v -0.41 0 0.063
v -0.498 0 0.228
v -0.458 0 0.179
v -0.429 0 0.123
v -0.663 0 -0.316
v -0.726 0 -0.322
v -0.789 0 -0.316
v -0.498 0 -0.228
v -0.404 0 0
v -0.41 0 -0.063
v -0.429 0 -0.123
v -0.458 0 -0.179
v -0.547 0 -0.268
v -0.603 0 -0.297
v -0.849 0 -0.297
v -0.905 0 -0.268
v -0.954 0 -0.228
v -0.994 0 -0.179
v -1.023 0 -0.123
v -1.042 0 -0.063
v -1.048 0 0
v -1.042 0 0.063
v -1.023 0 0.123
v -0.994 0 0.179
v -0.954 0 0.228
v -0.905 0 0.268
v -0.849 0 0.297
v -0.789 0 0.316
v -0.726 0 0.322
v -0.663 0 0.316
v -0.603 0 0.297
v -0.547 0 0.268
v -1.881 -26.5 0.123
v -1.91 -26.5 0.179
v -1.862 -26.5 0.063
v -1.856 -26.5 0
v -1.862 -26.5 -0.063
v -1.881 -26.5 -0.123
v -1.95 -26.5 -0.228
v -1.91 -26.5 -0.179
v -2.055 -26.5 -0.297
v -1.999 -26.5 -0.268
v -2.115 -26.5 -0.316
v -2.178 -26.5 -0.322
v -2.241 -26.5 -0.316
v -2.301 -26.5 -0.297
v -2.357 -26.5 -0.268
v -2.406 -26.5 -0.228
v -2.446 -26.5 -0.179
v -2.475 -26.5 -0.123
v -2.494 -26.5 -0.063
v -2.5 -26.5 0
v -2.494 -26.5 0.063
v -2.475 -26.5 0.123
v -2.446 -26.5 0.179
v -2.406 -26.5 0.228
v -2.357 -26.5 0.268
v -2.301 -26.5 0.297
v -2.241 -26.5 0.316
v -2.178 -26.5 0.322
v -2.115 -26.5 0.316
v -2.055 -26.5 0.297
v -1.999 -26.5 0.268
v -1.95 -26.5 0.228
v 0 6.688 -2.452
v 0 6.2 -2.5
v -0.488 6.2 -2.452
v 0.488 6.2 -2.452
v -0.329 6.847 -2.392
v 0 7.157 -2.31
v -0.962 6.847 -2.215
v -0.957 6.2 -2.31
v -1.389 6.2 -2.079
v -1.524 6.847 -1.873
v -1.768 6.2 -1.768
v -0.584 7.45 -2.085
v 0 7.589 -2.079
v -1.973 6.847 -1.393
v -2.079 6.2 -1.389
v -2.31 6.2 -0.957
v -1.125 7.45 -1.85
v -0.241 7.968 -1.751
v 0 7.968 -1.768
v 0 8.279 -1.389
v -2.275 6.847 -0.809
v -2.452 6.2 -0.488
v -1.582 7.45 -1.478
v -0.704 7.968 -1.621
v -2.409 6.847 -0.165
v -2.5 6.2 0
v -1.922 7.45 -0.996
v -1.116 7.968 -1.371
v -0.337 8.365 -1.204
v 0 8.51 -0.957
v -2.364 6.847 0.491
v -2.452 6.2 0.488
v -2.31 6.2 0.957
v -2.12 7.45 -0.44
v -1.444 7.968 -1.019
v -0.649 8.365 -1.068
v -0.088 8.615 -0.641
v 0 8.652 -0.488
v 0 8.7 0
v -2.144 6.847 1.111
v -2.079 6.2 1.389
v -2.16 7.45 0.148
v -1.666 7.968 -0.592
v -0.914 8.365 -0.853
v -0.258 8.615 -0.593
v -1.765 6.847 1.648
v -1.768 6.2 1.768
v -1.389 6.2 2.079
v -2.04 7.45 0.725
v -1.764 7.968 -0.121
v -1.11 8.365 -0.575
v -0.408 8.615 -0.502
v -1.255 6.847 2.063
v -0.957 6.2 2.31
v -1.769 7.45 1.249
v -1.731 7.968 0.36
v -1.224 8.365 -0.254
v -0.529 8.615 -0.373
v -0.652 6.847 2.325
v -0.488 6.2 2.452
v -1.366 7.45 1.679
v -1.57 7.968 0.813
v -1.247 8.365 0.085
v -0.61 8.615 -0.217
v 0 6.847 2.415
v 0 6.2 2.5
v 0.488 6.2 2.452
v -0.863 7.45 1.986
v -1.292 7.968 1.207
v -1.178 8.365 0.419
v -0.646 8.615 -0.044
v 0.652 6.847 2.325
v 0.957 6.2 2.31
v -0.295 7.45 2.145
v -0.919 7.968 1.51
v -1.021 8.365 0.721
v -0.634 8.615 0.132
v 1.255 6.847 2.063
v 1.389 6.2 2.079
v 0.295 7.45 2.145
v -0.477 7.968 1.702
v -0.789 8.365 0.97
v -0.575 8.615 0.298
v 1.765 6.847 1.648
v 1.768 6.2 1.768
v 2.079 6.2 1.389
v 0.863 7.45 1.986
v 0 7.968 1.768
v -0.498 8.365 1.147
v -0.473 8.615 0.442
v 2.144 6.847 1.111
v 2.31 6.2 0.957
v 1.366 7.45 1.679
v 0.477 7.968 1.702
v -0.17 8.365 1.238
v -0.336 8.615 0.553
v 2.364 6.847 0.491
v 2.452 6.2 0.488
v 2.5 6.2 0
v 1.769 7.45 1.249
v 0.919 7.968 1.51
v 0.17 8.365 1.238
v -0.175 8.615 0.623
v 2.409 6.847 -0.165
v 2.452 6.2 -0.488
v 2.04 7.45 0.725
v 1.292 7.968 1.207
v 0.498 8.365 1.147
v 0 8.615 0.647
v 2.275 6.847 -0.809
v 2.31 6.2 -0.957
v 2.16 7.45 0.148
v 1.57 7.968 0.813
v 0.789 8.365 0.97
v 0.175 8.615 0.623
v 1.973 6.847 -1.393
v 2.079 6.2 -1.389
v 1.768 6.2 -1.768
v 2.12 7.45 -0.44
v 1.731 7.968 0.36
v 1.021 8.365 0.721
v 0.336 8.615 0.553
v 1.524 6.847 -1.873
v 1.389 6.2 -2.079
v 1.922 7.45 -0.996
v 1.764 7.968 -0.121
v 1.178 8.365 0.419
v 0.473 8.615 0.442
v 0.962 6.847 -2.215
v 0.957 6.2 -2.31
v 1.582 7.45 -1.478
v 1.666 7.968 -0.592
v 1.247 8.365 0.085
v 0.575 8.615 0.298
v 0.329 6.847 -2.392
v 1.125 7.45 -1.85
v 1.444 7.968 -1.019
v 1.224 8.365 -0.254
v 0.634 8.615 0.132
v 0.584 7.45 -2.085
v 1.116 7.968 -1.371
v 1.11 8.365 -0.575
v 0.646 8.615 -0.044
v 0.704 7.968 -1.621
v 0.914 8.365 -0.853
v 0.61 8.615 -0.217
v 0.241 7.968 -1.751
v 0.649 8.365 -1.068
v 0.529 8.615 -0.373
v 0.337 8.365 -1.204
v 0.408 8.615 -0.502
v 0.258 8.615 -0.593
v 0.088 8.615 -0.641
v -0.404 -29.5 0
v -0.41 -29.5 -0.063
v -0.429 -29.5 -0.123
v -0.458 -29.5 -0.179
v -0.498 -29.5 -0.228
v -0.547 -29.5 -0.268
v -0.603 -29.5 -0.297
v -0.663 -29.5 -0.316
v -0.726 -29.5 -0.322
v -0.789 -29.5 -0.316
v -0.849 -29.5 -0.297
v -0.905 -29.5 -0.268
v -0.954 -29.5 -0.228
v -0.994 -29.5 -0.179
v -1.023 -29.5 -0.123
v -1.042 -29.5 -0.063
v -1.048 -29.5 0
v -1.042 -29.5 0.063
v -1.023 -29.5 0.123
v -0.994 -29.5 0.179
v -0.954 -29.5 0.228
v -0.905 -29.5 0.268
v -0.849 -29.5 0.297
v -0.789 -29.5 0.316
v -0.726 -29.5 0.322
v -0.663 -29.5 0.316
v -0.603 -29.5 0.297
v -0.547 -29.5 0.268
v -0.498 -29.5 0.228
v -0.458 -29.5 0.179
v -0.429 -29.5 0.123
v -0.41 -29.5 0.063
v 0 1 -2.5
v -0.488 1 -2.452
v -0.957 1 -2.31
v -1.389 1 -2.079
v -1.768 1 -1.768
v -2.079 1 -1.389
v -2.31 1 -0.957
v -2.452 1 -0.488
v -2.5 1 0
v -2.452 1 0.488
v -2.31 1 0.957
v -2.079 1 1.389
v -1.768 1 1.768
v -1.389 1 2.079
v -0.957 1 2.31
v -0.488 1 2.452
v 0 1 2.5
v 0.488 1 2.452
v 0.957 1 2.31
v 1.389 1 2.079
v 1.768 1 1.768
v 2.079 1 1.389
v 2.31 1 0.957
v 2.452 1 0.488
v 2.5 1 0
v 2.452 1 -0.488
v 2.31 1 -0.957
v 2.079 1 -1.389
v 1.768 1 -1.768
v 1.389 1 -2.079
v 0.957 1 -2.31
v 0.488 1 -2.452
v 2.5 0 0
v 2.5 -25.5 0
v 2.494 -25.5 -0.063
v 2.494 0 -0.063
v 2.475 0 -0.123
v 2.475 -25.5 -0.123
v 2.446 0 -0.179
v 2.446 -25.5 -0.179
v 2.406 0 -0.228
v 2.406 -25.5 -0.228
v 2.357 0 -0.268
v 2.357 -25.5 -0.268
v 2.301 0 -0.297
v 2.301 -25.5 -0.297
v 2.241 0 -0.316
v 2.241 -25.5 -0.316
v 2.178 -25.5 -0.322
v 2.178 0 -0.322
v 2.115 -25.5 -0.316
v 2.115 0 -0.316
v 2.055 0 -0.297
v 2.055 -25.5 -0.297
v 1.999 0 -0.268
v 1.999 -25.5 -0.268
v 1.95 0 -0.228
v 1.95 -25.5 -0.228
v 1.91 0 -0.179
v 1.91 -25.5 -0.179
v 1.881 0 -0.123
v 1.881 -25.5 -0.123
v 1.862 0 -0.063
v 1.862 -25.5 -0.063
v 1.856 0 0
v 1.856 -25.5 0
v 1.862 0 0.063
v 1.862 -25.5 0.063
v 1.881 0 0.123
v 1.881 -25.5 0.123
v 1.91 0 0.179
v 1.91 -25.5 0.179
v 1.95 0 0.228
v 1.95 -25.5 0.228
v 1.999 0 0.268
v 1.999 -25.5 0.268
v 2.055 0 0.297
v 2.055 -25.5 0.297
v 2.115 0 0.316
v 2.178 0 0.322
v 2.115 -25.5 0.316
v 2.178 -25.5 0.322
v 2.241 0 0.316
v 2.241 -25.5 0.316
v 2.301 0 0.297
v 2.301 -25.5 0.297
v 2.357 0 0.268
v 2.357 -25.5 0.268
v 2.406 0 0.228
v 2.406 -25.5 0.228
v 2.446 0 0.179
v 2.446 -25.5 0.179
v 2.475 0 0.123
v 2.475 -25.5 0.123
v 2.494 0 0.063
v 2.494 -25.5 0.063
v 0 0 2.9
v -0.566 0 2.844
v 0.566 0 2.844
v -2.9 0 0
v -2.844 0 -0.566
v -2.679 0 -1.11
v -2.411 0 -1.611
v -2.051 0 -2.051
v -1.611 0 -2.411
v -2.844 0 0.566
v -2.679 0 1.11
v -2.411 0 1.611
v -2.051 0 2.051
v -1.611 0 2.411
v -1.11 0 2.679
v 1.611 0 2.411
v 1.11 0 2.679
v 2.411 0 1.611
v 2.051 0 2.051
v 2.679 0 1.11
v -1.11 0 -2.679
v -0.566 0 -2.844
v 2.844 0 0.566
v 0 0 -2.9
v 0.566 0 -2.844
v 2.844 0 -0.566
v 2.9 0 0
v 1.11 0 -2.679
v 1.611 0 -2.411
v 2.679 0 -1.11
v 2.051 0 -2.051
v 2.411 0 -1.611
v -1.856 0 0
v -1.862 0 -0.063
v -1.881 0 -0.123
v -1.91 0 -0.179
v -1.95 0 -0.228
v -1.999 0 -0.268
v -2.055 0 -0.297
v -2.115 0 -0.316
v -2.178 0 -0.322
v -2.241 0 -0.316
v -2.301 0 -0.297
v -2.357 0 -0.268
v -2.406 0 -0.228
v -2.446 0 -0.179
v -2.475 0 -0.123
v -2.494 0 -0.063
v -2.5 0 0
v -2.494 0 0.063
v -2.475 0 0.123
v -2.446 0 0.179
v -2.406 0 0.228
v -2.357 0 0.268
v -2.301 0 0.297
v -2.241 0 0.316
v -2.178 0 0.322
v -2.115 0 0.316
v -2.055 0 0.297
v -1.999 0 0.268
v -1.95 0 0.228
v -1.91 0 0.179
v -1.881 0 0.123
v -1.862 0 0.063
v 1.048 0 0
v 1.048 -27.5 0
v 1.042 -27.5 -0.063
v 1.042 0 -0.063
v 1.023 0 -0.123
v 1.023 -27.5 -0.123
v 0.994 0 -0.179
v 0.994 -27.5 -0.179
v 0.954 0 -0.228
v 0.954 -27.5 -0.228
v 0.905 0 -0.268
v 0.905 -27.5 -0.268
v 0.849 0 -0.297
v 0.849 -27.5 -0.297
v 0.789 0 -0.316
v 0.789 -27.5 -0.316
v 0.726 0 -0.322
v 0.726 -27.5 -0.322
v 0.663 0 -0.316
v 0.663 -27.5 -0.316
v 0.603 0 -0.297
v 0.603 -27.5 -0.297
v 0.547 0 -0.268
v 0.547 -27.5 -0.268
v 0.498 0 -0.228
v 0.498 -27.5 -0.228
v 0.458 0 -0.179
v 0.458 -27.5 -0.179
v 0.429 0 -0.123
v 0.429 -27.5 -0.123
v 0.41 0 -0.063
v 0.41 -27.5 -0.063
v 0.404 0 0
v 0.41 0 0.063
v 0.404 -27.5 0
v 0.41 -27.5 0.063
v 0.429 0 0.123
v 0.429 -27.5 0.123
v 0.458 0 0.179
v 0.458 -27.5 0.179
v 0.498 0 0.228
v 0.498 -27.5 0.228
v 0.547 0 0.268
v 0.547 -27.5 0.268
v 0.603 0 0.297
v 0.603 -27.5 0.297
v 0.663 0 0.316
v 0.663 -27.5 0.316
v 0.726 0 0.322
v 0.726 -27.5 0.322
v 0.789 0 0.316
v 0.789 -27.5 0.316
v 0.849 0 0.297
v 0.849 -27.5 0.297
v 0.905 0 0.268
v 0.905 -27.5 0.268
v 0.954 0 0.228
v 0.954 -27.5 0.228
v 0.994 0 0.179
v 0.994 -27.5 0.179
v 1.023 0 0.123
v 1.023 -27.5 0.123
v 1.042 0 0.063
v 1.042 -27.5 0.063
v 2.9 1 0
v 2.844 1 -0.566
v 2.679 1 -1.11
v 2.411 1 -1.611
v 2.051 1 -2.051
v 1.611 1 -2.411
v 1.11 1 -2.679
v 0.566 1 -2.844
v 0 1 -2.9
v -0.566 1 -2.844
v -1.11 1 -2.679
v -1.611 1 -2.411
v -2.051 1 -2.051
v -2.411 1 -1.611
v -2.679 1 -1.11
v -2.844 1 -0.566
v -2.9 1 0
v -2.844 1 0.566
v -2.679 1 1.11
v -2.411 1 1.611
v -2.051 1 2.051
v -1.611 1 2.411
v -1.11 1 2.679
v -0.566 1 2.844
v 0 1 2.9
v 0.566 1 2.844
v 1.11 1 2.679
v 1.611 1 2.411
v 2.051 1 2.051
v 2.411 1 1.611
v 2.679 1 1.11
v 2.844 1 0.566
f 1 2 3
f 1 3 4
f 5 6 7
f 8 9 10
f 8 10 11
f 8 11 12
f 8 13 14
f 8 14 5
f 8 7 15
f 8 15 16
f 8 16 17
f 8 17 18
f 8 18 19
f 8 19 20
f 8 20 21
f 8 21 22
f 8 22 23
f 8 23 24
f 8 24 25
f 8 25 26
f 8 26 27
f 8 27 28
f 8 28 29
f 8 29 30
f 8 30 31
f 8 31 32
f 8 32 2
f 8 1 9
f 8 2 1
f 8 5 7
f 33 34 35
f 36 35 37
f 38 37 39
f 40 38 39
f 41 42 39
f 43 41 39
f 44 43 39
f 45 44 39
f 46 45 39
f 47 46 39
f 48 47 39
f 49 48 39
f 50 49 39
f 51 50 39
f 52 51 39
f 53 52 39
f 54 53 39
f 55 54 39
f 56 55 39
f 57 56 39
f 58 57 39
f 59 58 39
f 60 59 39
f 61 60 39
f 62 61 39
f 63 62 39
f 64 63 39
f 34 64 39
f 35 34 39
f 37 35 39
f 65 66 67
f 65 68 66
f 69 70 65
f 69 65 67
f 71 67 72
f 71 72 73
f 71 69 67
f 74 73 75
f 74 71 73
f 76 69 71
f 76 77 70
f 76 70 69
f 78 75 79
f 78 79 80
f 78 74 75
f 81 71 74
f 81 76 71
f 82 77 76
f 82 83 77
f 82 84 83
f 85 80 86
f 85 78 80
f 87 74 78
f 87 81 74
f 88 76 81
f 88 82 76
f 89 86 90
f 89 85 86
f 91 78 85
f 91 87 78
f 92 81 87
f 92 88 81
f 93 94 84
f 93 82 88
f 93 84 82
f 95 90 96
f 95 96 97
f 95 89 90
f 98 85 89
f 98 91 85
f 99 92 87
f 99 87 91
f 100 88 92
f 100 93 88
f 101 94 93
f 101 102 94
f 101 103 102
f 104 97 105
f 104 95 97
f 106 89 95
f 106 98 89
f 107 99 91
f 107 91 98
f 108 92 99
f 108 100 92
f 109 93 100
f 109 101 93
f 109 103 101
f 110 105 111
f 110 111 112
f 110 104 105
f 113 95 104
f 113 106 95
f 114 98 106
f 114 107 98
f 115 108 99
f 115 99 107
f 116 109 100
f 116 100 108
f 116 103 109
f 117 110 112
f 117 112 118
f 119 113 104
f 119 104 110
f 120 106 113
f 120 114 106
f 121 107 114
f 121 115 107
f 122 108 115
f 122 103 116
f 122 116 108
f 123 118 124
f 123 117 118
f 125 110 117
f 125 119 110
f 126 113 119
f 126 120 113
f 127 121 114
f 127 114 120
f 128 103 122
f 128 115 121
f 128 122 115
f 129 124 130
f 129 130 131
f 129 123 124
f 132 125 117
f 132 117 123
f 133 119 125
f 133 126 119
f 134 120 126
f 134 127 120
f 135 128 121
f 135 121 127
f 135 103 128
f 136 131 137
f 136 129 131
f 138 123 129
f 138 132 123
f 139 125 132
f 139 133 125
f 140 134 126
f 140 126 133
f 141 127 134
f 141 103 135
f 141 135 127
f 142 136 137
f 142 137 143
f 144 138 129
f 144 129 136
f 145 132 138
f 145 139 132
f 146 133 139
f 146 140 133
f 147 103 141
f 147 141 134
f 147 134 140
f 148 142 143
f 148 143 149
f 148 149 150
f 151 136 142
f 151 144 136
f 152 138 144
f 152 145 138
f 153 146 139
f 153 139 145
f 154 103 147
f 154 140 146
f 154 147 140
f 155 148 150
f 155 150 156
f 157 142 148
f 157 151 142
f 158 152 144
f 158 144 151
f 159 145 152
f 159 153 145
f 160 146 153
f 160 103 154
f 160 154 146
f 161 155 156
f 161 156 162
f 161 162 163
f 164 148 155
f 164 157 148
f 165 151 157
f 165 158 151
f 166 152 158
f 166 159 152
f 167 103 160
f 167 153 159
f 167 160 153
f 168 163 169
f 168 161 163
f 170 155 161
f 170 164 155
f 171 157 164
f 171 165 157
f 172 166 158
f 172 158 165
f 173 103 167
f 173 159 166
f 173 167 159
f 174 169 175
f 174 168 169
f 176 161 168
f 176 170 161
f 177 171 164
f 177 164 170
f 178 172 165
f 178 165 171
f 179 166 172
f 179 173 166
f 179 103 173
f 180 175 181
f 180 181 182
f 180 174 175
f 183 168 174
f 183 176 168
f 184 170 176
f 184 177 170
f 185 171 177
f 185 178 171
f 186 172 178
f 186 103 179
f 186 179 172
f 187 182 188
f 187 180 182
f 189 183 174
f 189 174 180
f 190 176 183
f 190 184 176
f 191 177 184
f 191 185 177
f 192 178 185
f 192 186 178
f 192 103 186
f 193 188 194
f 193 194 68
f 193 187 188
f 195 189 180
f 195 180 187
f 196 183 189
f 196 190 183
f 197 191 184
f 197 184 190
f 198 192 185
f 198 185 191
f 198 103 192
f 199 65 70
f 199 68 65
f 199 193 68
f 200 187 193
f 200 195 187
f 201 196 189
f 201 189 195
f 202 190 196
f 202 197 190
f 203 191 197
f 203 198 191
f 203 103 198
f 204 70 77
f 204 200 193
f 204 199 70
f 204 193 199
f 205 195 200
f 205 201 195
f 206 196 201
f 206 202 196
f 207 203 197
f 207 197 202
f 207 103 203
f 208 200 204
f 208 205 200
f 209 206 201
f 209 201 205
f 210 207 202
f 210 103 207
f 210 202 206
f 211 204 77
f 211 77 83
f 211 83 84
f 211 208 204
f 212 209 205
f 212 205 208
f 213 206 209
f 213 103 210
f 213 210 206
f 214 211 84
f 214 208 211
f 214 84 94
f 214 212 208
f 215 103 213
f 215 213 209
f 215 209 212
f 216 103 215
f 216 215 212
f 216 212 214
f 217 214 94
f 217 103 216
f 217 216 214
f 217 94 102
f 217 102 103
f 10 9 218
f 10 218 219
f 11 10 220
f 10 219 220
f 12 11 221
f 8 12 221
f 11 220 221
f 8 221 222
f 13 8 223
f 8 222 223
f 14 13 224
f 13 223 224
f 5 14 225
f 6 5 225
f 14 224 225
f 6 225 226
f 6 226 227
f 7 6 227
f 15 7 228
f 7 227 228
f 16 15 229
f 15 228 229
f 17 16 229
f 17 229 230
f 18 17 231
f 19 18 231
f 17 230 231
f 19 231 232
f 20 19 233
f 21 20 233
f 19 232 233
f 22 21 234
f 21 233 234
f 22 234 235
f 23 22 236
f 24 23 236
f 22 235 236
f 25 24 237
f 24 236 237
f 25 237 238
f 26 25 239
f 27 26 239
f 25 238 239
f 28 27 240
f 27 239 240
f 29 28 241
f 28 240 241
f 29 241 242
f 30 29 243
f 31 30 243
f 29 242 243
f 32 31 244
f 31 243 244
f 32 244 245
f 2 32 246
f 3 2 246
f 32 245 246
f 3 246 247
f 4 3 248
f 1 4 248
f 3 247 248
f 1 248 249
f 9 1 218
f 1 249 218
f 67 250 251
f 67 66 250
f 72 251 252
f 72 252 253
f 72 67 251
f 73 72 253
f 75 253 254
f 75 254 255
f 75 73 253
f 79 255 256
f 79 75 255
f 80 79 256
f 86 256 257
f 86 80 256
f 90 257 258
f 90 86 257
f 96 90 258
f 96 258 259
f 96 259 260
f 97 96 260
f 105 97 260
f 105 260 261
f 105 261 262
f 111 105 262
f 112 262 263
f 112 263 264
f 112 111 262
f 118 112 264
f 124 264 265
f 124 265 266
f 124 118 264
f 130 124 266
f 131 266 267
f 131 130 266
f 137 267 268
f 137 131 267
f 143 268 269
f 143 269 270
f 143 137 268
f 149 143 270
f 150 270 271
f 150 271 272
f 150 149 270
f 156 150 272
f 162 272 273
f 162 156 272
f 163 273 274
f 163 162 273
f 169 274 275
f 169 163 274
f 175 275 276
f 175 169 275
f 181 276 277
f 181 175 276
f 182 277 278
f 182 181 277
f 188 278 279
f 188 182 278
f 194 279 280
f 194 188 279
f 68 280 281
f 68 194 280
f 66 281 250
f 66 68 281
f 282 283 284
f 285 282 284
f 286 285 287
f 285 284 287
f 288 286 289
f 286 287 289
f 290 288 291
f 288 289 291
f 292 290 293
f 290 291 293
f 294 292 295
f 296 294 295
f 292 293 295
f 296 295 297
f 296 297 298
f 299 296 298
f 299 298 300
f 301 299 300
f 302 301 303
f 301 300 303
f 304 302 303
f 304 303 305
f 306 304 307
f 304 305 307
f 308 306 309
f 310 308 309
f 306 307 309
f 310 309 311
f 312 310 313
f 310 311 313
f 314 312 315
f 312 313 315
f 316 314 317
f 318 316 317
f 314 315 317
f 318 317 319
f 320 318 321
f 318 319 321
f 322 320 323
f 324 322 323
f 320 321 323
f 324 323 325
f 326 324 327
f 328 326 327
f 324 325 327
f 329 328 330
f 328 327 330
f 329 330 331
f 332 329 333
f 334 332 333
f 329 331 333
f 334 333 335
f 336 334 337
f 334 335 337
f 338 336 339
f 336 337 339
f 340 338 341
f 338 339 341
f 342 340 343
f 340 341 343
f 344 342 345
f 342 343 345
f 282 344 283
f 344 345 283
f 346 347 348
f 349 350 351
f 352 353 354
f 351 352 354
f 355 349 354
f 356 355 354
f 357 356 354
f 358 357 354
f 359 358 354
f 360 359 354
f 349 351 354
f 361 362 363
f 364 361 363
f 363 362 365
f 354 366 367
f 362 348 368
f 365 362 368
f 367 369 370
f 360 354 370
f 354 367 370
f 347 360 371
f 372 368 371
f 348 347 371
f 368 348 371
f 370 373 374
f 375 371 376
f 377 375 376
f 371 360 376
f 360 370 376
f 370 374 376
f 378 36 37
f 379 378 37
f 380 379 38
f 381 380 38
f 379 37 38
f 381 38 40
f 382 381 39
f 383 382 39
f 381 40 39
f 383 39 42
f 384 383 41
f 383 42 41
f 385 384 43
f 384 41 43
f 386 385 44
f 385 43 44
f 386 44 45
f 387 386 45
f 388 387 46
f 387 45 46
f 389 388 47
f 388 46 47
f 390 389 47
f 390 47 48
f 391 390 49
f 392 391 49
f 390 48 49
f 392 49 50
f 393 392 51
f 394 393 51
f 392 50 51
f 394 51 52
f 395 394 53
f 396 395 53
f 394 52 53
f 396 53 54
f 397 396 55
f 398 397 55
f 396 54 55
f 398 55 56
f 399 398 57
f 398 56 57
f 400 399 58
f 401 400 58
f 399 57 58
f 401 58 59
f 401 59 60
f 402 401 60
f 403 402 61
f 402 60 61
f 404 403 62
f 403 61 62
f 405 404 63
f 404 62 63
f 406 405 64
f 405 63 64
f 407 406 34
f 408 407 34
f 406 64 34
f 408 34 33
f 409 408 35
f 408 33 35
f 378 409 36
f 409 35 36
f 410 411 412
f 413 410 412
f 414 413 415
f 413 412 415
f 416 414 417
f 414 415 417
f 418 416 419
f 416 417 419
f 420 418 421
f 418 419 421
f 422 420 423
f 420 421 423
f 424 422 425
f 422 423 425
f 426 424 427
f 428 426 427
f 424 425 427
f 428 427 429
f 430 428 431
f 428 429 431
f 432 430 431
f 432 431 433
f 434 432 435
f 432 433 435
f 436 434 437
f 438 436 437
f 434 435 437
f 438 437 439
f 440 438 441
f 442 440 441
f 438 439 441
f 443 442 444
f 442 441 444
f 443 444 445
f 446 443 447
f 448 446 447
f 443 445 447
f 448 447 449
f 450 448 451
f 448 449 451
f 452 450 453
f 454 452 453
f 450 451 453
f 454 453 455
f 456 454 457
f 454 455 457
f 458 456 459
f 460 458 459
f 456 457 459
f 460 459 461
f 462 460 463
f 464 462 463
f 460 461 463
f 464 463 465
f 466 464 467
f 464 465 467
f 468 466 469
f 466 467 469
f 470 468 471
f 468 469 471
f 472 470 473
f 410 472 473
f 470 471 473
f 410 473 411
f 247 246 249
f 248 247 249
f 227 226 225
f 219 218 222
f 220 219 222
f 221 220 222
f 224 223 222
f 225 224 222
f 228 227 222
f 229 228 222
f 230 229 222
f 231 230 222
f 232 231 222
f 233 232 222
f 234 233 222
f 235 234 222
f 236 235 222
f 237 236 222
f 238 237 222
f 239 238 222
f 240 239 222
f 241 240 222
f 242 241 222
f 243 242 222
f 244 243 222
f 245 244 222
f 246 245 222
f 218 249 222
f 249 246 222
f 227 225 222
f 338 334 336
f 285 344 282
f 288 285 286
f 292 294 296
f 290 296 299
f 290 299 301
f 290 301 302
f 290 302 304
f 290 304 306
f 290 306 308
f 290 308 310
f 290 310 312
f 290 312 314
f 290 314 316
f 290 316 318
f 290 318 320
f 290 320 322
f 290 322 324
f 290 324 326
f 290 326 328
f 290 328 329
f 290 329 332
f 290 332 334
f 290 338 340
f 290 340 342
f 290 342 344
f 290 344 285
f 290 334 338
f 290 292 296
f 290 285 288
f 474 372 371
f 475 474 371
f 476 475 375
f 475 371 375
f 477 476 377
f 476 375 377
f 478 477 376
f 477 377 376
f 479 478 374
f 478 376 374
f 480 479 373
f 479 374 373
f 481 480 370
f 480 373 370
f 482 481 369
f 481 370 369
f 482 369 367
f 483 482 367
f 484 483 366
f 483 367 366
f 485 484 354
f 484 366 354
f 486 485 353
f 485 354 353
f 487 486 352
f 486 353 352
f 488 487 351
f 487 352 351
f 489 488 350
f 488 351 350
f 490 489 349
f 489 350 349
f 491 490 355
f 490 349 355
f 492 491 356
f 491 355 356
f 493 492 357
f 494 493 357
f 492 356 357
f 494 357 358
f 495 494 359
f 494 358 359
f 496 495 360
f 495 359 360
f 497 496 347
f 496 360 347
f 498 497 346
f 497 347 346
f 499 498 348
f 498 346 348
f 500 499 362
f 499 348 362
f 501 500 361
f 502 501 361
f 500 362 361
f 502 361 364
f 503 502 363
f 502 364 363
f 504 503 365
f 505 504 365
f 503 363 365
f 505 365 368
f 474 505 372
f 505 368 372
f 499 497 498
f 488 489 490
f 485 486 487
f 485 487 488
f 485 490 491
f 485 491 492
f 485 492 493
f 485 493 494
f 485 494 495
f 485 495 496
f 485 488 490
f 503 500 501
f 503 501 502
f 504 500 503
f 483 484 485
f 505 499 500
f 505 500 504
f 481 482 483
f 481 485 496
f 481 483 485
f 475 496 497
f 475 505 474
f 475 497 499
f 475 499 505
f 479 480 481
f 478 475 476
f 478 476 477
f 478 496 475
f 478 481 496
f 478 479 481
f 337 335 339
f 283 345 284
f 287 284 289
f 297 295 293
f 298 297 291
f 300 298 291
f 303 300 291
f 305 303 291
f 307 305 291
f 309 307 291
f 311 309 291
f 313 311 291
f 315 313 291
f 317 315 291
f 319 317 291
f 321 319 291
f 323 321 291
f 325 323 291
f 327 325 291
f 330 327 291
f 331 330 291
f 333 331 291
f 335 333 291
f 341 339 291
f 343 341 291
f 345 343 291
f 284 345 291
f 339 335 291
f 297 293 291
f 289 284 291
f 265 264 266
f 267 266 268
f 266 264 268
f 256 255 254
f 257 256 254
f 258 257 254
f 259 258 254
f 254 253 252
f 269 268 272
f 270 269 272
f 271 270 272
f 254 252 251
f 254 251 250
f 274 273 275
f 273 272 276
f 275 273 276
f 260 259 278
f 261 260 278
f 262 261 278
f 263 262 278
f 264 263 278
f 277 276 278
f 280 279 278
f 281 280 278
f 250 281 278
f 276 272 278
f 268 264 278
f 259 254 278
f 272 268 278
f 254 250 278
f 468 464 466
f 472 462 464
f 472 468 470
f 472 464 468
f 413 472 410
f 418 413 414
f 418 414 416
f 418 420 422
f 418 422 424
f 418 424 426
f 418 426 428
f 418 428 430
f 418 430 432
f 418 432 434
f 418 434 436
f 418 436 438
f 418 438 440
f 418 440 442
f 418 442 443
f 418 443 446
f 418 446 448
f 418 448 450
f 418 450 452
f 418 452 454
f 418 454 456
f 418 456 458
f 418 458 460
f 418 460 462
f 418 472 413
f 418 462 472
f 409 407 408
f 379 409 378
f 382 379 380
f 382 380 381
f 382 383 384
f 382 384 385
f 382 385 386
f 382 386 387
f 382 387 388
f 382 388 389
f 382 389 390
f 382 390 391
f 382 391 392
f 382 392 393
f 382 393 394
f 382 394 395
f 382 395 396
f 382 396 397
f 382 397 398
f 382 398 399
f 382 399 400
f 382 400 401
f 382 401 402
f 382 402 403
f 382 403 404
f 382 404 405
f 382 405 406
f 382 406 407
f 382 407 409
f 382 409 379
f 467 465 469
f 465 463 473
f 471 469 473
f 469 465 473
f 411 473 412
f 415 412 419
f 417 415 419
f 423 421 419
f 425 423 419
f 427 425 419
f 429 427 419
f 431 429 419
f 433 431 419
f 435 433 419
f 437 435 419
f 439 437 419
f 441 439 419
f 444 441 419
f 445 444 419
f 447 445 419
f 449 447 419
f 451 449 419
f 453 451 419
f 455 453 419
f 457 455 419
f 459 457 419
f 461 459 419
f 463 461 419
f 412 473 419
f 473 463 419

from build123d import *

# Parameters (mm, degrees)
SKETCH2_R           = 0.3219
BOSS_EXTRUDE1_DEPTH = 26.5
SKETCH2_3_R         = 0.3219
BOSS_EXTRUDE2_DEPTH = 29.5
SKETCH2_4_R         = 0.3219
BOSS_EXTRUDE3_DEPTH = 27.5
SKETCH2_5_R         = 0.3219
BOSS_EXTRUDE4_DEPTH = 25.5
SPLIT1_START        = -26.5
SPLIT1_OUTLINE_R    = 0.3219
SPLIT1_DEPTH        = 26.5
SPLIT1_START_2      = -29.5
SPLIT1_2_OUTLINE_R  = 0.3219
SPLIT1_2_DEPTH      = 29.5
SPLIT1_START_3      = -27.5
SPLIT1_3_OUTLINE_R  = 0.3219
SPLIT1_3_DEPTH      = 27.5
SPLIT1_START_4      = -25.5
SPLIT1_4_OUTLINE_R  = 0.3219
SPLIT1_4_DEPTH      = 25.5
SPLIT1_5_OUTLINE_R  = 2.9
SPLIT1_5_DEPTH      = 1
SPLIT1_6_OUTLINE_R  = 2.9
SPLIT1_6_DEPTH      = 30.5


# Read off the part's stored shape, not the designer's step: Split1
with BuildPart() as part:
    # Sketch1 → Revolve1 (revolve)
    with BuildSketch(Plane.XY, mode=Mode.PRIVATE) as revolve1_sk:
        with BuildLine():
            Line((0, 0), (2.9, 0))
            Line((2.9, 0), (2.9, 1))
            Line((2.9, 1), (2.5, 1))
            Line((2.5, 1), (2.5, 6.2))
            ThreePointArc((2.5, 6.2), (1.767766953, 7.967766953), (0, 8.7))
            Line((0, 8.7), (0, 0))
        make_face()
    revolve(revolve1_sk.sketch.rotate(Axis((0, 0, 0), (0, 1, 0)), 90), axis=Axis((0, 0, 0), (0, 1, 0)))

    # Sketch2 → Boss-Extrude1 (add)
    with BuildSketch(Plane.XZ):
        with Locations(Location((-2.1781, 0, 0), (0, 0, 270))):
            Circle(SKETCH2_R)
    extrude(amount=BOSS_EXTRUDE1_DEPTH)

    # Sketch2<3> → Boss-Extrude2 (add)
    with BuildSketch(Plane.XZ):
        with Locations(Location((-0.726033333, 0, 0), (0, 0, 270))):
            Circle(SKETCH2_3_R)
    extrude(amount=BOSS_EXTRUDE2_DEPTH)

    # Sketch2<4> → Boss-Extrude3 (add)
    with BuildSketch(Plane.XZ):
        with Locations(Location((0.726033333, 0, 0), (0, 0, 270))):
            Circle(SKETCH2_4_R)
    extrude(amount=BOSS_EXTRUDE3_DEPTH)

    # Sketch2<5> → Boss-Extrude4 (add)
    with BuildSketch(Plane.XZ):
        with Locations(Location((2.1781, 0, 0), (0, 0, 270))):
            Circle(SKETCH2_5_R)
    extrude(amount=BOSS_EXTRUDE4_DEPTH)

    # Split1 6 outline → Split1 6 (cut)
    with BuildSketch(Plane(origin=(0, 0, 0), x_dir=(1, 0, 0), z_dir=(0, 1, 0)).offset(SPLIT1_START_2)):
        Circle(SPLIT1_6_OUTLINE_R)
    extrude(amount=SPLIT1_6_DEPTH, mode=Mode.SUBTRACT)


with BuildPart() as body_2:
    # Split1 outline → Split1 (new body)
    with BuildSketch(Plane(origin=(0, 0, 0), x_dir=(1, 0, 0), z_dir=(0, 1, 0)).offset(SPLIT1_START)):
        with Locations((-2.1781, 0)):
            Circle(SPLIT1_OUTLINE_R)
    extrude(amount=SPLIT1_DEPTH)


with BuildPart() as body_3:
    # Split1 2 outline → Split1 2 (new body)
    with BuildSketch(Plane(origin=(0, 0, 0), x_dir=(1, 0, 0), z_dir=(0, 1, 0)).offset(SPLIT1_START_2)):
        with Locations((-0.726033333, 0)):
            Circle(SPLIT1_2_OUTLINE_R)
    extrude(amount=SPLIT1_2_DEPTH)


with BuildPart() as body_4:
    # Split1 3 outline → Split1 3 (new body)
    with BuildSketch(Plane(origin=(0, 0, 0), x_dir=(1, 0, 0), z_dir=(0, 1, 0)).offset(SPLIT1_START_3)):
        with Locations((0.726033333, 0)):
            Circle(SPLIT1_3_OUTLINE_R)
    extrude(amount=SPLIT1_3_DEPTH)


with BuildPart() as body_5:
    # Split1 4 outline → Split1 4 (new body)
    with BuildSketch(Plane(origin=(0, 0, 0), x_dir=(1, 0, 0), z_dir=(0, 1, 0)).offset(SPLIT1_START_4)):
        with Locations((2.1781, 0)):
            Circle(SPLIT1_4_OUTLINE_R)
    extrude(amount=SPLIT1_4_DEPTH)


with BuildPart() as body_6:
    # Split1 5 outline → Split1 5 (new body)
    with BuildSketch(Plane(origin=(0, 0, 0), x_dir=(1, 0, 0), z_dir=(0, 1, 0))):
        Circle(SPLIT1_5_OUTLINE_R)
    extrude(amount=SPLIT1_5_DEPTH)


solid = Compound([part.part, body_2.part, body_3.part, body_4.part, body_5.part, body_6.part])
